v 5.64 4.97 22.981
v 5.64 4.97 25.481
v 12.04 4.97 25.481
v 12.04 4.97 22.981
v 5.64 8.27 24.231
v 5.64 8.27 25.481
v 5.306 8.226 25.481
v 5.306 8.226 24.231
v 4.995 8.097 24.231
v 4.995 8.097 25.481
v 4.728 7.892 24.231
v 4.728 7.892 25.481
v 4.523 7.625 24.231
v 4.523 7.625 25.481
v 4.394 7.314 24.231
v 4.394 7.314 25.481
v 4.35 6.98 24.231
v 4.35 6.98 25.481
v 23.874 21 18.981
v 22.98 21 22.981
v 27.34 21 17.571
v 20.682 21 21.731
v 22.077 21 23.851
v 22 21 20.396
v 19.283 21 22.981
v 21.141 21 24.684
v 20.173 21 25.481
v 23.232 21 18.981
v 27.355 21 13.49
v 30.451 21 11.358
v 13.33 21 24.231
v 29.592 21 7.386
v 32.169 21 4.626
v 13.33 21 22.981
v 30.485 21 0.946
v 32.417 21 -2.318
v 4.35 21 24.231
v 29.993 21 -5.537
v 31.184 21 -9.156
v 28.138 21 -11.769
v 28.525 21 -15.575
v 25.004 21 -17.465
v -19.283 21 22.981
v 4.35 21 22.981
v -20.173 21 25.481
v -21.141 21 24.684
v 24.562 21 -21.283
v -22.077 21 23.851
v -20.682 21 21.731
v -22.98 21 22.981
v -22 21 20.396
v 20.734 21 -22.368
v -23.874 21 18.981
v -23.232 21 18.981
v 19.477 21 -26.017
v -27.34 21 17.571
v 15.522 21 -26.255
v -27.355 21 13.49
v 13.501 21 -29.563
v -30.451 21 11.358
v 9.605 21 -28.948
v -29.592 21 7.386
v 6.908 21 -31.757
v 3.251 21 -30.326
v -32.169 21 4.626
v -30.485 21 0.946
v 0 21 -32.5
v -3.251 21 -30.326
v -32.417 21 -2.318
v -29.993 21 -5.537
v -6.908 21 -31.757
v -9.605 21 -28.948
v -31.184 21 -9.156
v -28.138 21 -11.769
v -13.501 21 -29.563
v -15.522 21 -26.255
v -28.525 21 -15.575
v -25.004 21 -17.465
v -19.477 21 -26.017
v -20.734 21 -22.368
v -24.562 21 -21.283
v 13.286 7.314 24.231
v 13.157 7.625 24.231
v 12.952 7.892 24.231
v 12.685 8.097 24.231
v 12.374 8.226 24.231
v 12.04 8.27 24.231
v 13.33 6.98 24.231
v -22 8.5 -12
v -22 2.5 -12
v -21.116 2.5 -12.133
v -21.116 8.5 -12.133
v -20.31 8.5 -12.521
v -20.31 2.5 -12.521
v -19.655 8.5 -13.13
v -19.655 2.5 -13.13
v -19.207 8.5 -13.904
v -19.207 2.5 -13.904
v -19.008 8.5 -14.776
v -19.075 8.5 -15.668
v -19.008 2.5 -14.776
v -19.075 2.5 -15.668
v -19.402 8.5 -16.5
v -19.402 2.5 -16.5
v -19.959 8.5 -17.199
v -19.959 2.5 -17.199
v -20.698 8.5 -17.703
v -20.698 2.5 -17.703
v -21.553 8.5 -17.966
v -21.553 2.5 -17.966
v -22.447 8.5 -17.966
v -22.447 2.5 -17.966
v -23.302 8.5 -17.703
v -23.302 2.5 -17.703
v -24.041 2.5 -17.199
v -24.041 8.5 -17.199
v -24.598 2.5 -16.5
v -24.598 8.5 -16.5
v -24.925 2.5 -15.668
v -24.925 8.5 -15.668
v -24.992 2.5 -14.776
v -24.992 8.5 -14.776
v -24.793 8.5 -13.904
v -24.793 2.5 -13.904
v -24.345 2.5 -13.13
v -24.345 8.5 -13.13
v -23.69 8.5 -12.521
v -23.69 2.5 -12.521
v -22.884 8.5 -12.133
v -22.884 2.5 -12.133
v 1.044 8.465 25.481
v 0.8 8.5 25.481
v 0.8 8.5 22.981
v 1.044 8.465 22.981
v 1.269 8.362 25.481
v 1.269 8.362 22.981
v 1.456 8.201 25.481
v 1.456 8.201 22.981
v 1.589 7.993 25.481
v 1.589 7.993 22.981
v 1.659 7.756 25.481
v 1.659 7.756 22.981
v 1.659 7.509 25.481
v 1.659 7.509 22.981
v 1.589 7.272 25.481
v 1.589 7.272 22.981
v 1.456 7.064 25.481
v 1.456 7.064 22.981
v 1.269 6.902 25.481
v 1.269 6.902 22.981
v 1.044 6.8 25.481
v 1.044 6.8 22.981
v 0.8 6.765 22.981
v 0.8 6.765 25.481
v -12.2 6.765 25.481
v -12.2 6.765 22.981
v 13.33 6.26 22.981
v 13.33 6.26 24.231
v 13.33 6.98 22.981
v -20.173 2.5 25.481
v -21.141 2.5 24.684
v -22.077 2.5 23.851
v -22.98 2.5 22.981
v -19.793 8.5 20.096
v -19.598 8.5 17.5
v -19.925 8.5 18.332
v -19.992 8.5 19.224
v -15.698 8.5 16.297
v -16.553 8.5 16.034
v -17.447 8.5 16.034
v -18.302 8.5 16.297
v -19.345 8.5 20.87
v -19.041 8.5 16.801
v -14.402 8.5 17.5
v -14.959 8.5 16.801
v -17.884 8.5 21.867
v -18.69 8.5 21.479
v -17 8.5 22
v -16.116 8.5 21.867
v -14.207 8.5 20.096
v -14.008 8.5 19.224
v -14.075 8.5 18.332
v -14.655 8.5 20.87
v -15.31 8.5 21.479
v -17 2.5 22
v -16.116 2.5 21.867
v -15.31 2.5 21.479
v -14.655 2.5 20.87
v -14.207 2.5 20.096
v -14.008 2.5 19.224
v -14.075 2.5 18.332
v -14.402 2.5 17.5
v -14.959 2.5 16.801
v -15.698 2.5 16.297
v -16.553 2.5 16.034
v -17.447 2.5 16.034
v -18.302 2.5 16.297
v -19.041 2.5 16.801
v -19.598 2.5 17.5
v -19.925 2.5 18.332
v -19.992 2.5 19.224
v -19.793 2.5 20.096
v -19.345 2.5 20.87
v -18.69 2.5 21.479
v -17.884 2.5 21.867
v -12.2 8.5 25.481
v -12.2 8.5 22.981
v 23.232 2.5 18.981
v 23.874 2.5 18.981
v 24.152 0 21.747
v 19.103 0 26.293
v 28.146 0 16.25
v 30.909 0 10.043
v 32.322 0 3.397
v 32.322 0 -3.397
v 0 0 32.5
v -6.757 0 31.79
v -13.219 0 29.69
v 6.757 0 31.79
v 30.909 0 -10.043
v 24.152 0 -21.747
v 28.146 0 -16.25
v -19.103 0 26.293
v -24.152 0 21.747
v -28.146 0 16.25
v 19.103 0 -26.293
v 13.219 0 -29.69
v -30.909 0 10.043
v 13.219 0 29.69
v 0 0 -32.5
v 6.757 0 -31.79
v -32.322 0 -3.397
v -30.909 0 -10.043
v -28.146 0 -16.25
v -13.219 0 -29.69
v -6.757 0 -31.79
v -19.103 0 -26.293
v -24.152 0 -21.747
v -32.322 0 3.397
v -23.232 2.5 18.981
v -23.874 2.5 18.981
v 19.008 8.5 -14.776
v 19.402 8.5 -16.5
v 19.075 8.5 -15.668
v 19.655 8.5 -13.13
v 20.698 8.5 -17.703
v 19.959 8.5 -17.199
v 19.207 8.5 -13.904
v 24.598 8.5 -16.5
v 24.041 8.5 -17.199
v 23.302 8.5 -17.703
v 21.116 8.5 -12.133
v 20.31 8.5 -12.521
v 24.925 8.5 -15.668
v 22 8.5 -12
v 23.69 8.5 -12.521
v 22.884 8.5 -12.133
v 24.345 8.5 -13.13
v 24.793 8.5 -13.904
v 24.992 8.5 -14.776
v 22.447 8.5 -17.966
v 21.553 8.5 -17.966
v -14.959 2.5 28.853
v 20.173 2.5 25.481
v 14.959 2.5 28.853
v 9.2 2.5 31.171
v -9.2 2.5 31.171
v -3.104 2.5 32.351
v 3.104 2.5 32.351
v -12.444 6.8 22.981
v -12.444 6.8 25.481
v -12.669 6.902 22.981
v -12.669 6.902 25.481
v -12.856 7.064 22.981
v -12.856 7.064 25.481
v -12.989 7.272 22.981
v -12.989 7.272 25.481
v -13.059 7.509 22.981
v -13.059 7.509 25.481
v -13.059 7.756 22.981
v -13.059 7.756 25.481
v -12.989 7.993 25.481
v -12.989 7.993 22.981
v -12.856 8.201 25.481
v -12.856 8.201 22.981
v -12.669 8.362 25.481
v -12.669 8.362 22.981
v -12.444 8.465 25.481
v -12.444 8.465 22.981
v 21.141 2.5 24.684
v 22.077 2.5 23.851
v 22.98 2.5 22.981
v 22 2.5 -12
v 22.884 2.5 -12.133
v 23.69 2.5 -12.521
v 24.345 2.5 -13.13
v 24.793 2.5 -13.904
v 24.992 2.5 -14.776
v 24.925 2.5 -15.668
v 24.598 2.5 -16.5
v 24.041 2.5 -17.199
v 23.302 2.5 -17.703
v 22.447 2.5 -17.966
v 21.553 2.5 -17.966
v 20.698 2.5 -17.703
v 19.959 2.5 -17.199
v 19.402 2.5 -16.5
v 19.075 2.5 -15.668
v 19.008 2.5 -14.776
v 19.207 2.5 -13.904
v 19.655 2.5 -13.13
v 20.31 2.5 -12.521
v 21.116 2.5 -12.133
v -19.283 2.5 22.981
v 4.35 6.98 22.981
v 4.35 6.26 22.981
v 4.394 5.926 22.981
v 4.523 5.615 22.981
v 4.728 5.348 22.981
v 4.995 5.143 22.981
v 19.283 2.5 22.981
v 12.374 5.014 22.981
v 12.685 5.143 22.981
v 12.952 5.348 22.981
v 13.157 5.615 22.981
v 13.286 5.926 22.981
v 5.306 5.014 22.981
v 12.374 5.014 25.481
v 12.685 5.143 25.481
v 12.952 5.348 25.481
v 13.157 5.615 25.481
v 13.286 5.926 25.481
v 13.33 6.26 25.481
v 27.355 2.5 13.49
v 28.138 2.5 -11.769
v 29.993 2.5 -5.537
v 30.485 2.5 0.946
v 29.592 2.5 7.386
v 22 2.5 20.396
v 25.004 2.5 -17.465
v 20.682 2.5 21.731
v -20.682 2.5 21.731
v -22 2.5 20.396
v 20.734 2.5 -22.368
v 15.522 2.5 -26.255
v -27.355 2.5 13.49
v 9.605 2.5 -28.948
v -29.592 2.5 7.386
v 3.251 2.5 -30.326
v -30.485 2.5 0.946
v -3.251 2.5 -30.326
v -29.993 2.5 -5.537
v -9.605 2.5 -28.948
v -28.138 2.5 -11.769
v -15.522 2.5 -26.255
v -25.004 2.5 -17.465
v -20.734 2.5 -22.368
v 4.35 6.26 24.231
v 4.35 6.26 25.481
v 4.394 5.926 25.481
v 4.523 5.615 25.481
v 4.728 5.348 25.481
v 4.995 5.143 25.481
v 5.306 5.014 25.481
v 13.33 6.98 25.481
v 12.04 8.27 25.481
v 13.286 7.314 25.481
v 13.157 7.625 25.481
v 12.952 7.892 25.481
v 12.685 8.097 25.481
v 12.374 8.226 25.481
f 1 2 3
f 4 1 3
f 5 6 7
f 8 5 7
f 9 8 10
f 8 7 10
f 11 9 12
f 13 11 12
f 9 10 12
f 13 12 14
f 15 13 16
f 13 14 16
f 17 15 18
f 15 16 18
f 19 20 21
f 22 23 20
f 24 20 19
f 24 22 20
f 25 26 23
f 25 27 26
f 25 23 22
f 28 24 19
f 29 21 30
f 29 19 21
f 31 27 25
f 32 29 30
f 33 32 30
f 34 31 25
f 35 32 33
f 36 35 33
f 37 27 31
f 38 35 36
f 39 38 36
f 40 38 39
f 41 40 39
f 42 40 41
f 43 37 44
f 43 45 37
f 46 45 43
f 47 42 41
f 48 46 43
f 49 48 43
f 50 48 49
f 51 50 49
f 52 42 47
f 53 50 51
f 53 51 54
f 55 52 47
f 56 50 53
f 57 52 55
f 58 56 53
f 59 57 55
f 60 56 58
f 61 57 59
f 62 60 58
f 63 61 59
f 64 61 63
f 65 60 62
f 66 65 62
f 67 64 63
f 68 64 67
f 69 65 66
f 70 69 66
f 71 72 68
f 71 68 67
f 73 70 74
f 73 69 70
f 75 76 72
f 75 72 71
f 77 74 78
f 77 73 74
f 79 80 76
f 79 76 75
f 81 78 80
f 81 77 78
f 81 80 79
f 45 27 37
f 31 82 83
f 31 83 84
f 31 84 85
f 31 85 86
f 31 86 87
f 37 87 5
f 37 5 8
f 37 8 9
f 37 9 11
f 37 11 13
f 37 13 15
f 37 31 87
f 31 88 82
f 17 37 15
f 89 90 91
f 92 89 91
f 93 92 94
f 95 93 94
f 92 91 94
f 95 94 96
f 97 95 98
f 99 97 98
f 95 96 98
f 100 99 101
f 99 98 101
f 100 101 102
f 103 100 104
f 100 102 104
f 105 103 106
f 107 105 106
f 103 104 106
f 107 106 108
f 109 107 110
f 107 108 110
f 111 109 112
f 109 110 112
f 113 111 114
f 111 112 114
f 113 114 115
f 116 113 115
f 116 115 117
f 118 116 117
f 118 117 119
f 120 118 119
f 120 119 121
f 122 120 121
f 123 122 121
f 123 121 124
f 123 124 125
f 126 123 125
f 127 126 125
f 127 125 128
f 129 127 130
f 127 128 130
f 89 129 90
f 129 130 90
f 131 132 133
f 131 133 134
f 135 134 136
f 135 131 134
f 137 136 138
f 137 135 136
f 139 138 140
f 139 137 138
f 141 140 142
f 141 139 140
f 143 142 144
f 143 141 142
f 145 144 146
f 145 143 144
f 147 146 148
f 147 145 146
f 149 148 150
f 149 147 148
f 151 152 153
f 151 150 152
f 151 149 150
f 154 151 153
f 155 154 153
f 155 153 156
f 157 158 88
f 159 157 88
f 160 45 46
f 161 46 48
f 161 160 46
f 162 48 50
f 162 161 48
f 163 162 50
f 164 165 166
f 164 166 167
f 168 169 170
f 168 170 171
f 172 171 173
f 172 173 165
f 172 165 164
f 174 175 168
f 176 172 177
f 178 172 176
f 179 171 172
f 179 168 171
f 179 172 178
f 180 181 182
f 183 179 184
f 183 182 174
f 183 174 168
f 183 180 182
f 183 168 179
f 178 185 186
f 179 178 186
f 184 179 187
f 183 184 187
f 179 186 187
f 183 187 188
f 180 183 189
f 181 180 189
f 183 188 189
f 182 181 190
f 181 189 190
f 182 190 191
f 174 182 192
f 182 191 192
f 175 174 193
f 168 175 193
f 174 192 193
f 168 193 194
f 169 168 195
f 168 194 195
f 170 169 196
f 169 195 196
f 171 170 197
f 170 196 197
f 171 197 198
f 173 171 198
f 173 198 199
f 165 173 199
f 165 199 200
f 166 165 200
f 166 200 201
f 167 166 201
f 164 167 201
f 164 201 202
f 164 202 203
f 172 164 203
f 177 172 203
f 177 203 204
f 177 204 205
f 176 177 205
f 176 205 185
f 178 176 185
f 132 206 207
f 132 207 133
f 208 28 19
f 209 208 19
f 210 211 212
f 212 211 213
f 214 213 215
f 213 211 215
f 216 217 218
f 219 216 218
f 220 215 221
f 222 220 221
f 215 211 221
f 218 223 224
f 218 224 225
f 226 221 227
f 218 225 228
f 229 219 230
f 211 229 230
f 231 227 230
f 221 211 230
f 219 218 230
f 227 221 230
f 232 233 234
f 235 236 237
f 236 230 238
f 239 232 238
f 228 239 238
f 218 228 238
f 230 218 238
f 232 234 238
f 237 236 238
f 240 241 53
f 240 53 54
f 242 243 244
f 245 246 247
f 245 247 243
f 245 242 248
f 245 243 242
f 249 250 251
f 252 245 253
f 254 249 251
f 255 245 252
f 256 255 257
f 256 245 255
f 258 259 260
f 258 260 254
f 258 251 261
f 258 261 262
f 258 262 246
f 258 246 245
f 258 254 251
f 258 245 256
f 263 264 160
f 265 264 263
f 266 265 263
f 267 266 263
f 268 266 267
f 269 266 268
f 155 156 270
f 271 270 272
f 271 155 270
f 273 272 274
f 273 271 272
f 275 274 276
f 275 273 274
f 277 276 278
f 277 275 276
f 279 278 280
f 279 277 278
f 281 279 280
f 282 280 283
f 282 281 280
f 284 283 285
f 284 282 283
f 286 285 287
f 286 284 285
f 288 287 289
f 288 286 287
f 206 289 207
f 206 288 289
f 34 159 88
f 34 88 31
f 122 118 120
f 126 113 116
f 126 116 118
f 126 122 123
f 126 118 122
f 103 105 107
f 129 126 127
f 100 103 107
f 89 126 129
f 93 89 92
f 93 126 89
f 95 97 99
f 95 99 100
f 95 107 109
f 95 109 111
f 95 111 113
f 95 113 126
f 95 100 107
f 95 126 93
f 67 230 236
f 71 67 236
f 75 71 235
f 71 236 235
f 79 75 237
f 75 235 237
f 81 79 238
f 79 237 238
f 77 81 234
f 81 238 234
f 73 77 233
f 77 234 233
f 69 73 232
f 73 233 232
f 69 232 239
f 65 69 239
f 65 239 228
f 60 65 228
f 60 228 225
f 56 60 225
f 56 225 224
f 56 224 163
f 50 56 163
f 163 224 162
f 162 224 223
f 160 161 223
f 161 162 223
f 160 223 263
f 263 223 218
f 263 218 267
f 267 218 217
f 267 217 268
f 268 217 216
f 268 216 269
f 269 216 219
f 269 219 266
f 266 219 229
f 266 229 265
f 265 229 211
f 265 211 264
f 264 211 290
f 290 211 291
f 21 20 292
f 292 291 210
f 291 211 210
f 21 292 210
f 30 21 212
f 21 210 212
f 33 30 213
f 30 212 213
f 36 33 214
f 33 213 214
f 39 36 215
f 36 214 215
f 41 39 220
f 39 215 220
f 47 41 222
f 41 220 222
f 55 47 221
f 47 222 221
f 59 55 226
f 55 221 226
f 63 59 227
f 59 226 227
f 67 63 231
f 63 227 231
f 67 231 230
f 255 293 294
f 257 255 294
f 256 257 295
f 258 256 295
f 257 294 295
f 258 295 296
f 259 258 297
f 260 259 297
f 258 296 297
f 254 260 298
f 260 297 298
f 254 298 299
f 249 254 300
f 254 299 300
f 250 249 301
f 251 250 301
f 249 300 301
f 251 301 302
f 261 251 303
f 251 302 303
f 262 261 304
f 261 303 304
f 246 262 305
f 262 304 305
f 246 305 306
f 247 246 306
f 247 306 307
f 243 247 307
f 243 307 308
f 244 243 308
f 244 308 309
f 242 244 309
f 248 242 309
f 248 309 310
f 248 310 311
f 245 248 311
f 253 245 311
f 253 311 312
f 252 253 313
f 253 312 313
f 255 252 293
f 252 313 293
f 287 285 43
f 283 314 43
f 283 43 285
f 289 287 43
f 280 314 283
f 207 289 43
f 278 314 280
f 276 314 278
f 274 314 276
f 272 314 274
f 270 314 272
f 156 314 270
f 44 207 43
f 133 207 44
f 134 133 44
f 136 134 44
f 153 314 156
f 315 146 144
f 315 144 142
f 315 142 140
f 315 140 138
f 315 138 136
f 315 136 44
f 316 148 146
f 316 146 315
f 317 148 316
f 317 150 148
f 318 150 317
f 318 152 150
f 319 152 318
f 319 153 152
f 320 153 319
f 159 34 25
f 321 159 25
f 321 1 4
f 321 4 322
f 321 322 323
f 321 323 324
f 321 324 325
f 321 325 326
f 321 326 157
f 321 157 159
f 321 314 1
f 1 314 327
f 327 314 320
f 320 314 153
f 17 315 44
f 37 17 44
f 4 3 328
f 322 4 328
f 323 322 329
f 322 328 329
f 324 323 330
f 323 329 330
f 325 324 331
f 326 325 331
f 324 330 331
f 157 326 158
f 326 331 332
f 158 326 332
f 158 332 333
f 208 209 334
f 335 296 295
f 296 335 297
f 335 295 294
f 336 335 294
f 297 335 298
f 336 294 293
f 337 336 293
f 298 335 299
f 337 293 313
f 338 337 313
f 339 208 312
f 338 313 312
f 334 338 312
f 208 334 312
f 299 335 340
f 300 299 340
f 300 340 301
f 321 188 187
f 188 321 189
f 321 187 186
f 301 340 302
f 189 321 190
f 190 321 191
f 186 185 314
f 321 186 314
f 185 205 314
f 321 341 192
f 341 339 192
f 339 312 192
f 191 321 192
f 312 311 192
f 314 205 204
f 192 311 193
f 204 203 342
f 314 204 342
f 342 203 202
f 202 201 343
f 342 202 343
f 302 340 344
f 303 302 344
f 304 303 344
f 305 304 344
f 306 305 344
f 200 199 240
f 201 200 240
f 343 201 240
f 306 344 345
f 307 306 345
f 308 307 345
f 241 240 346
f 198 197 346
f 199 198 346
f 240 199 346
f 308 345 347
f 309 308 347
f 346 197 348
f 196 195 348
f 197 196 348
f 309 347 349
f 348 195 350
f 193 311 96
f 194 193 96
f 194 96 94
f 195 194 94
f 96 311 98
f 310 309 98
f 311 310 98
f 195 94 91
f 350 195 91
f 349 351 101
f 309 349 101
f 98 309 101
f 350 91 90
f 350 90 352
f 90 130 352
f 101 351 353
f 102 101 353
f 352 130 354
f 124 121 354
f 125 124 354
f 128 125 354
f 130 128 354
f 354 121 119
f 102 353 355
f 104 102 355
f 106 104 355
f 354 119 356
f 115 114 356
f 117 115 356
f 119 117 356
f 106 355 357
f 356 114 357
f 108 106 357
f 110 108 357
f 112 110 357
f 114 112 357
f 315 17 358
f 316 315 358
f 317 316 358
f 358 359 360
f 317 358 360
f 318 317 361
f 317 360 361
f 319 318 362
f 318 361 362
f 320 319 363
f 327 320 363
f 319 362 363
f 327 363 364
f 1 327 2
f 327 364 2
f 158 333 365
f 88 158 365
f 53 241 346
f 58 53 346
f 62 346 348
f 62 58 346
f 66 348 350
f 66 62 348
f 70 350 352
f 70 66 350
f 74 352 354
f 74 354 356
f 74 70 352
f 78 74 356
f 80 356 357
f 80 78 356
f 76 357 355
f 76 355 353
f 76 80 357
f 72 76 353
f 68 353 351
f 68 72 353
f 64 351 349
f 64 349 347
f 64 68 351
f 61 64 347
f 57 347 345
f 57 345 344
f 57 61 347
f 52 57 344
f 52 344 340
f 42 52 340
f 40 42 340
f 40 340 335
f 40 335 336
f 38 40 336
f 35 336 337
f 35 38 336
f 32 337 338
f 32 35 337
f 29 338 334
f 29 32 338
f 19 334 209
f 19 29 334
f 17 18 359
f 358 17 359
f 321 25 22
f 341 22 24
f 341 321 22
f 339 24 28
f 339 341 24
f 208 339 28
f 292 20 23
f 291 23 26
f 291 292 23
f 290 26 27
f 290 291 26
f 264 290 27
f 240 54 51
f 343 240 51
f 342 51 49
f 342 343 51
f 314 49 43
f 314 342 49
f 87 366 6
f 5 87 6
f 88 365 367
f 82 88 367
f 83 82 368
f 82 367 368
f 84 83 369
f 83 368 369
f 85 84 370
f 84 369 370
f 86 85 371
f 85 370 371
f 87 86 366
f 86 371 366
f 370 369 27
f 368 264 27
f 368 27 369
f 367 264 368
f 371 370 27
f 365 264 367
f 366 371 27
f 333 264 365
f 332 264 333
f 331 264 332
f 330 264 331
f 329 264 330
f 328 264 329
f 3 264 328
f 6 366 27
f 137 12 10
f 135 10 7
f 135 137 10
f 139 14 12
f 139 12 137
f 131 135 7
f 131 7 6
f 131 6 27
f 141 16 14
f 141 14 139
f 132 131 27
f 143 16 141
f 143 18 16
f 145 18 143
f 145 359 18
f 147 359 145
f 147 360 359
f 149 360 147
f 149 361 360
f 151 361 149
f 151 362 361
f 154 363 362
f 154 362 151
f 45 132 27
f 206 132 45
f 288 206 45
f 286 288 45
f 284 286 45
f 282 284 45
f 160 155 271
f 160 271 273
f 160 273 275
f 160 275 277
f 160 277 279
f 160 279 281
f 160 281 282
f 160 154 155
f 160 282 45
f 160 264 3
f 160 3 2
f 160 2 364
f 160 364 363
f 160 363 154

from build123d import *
from build123d.topology import SkipClean

# Parameters (mm, degrees)
SKETCH1_R           = 32.5
BOSS_EXTRUDE1_DEPTH = 21
SHELL1_T            = -2.5
CUT_EXTRUDE2_START  = -18.5
CUT_EXTRUDE2_DEPTH  = 18.5
BOSS_EXTRUDE2_DEPTH = 18.5
CUT_EXTRUDE4_DEPTH  = 18.5
SKETCH9_R           = 3
BOSS_EXTRUDE3_DEPTH = 6
CUT_EXTRUDE3_REACH  = 71.707
SKETCH8_W           = 8.98
SKETCH8_H           = 14.74
CUT_EXTRUDE5_DEPTH  = 1.25


with BuildPart() as part:
    # Sketch1 → Boss-Extrude1 (new body)
    with BuildSketch(Plane(origin=(0, 0, 0), x_dir=(1, 0, 0), z_dir=(0, 1, 0))):
        with Locations(Location((0, 0, 0), (0, 0, 90))):
            Circle(SKETCH1_R)
    extrude(amount=BOSS_EXTRUDE1_DEPTH)

    # Shell1
    shell1_openings = [part.faces().sort_by_distance(p)[0] for p in [
        (0, 21, 0),
    ]]
    offset(amount=SHELL1_T, openings=shell1_openings, kind=Kind.INTERSECTION)

    # Sketch4 → Cut-Extrude2 (cut)
    with BuildSketch(Plane(origin=(0, 21, 0), x_dir=(1, 0, 0), z_dir=(0, 1, 0)).offset(CUT_EXTRUDE2_START)):
        with BuildLine():
            Line((-19.2835, -22.981440942), (19.2835, -22.981440942))
            Line((19.2835, -22.981440942), (22.980499826, -22.981440942))
            ThreePointArc((22.980499826, -22.981440942), (0, -32.5), (-22.980499826, -22.981440942))
            Line((-22.980499826, -22.981440942), (-19.2835, -22.981440942))
        make_face()
    extrude(amount=CUT_EXTRUDE2_DEPTH, mode=Mode.SUBTRACT)

    # Sketch5 → Boss-Extrude2 (add, through all)
    with SkipClean():  # the faces are left unmerged after this step: merging them gives an invalid solid
        with BuildSketch(Plane(origin=(0, 2.5, 0), x_dir=(1, 0, 0), z_dir=(0, 1, 0))):
            with BuildLine():
                Line((-22.980499826, -22.981440942), (22.980499826, -22.981440942))
                ThreePointArc((22.980499826, -22.981440942), (21.612881002, -24.27206985), (20.17290677, -25.481440942))
                Line((20.17290677, -25.481440942), (-20.17290677, -25.481440942))
                ThreePointArc((-20.17290677, -25.481440942), (-21.612881002, -24.27206985), (-22.980499826, -22.981440942))
            make_face()
        extrude(amount=BOSS_EXTRUDE2_DEPTH)

    # Sketch7 → Cut-Extrude4 (cut)
    with SkipClean():  # the faces are left unmerged after this step: merging them gives an invalid solid
        with BuildSketch(Plane(origin=(0, 21, 0), x_dir=(1, 0, 0), z_dir=(0, 1, 0))):
            with BuildLine():
                Line((-23.231549664, -18.981440942), (-23.873728234, -18.981440942))
                ThreePointArc((-23.873728234, -18.981440942), (0, 30.5), (23.873728234, -18.981440942))
                Line((23.873728234, -18.981440942), (23.231549664, -18.981440942))
                Line((23.231549664, -18.981440942), (-23.231549664, -18.981440942))
            make_face()
        extrude(amount=-CUT_EXTRUDE4_DEPTH, mode=Mode.SUBTRACT)

    # Sketch9 → Boss-Extrude3 (add)
    with SkipClean():  # the faces are left unmerged after this step: merging them gives an invalid solid
        with BuildSketch(Plane(origin=(0, 2.5, 0), x_dir=(1, 0, 0), z_dir=(0, 1, 0))):
            with Locations(Location((-22, 15, 0), (0, 0, 270))):
                Circle(SKETCH9_R)
            with Locations(Location((22, 15, 0), (0, 0, 270))):
                Circle(SKETCH9_R)
            with Locations(Location((-17, -19, 0), (0, 0, 270))):
                Circle(SKETCH9_R)
        extrude(amount=BOSS_EXTRUDE3_DEPTH)

    # Sketch6 → Cut-Extrude3 (cut, up to next)
    with BuildSketch(Plane.XY.offset(25.481440942), mode=Mode.PRIVATE) as cut_extrude3_sk1:
        with BuildLine():
            Line((-12.2, 8.5), (0.8, 8.5))
            ThreePointArc((0.8, 8.5), (1.667712103, 7.632287897), (0.8, 6.764575794))
            Line((0.8, 6.764575794), (-12.2, 6.764575794))
            ThreePointArc((-12.2, 6.764575794), (-13.067712103, 7.632287897), (-12.2, 8.5))
        make_face()
    cut_extrude3_tool1 = extrude(cut_extrude3_sk1.sketch, amount=-CUT_EXTRUDE3_REACH, mode=Mode.PRIVATE) & part.part
    # Sketch6 → Cut-Extrude3 (cut, up to next)
    with BuildSketch(Plane.XY.offset(25.481440942), mode=Mode.PRIVATE) as cut_extrude3_sk2:
        with BuildLine():
            Line((5.64, 4.97), (12.04, 4.97))
            ThreePointArc((12.04, 4.97), (12.952167748, 5.347832252), (13.33, 6.26))
            Line((13.33, 6.26), (13.33, 6.98))
            ThreePointArc((13.33, 6.98), (12.952167748, 7.892167748), (12.04, 8.27))
            Line((12.04, 8.27), (5.64, 8.27))
            ThreePointArc((5.64, 8.27), (4.727832252, 7.892167748), (4.35, 6.98))
            Line((4.35, 6.98), (4.35, 6.26))
            ThreePointArc((4.35, 6.26), (4.727832252, 5.347832252), (5.64, 4.97))
        make_face()
    cut_extrude3_tool2 = extrude(cut_extrude3_sk2.sketch, amount=-CUT_EXTRUDE3_REACH, mode=Mode.PRIVATE) & part.part
    add(cut_extrude3_tool1.solids().sort_by_distance((-5.7, 7.632288, 25.481441))[0], mode=Mode.SUBTRACT)
    add(cut_extrude3_tool2.solids().sort_by_distance((8.84, 6.62, 25.481441))[0], mode=Mode.SUBTRACT)

    # Sketch8 → Cut-Extrude5 (cut)
    with SkipClean():  # the faces are left unmerged after this step: merging them gives an invalid solid
        with BuildSketch(Plane(origin=(0, 0, 22.981440942), x_dir=(-1, 0, 0), z_dir=(0, 0, -1))):
            with Locations((-8.84, 13.63)):
                Rectangle(SKETCH8_W, SKETCH8_H)
        extrude(amount=-CUT_EXTRUDE5_DEPTH, mode=Mode.SUBTRACT)


solid = part.part
